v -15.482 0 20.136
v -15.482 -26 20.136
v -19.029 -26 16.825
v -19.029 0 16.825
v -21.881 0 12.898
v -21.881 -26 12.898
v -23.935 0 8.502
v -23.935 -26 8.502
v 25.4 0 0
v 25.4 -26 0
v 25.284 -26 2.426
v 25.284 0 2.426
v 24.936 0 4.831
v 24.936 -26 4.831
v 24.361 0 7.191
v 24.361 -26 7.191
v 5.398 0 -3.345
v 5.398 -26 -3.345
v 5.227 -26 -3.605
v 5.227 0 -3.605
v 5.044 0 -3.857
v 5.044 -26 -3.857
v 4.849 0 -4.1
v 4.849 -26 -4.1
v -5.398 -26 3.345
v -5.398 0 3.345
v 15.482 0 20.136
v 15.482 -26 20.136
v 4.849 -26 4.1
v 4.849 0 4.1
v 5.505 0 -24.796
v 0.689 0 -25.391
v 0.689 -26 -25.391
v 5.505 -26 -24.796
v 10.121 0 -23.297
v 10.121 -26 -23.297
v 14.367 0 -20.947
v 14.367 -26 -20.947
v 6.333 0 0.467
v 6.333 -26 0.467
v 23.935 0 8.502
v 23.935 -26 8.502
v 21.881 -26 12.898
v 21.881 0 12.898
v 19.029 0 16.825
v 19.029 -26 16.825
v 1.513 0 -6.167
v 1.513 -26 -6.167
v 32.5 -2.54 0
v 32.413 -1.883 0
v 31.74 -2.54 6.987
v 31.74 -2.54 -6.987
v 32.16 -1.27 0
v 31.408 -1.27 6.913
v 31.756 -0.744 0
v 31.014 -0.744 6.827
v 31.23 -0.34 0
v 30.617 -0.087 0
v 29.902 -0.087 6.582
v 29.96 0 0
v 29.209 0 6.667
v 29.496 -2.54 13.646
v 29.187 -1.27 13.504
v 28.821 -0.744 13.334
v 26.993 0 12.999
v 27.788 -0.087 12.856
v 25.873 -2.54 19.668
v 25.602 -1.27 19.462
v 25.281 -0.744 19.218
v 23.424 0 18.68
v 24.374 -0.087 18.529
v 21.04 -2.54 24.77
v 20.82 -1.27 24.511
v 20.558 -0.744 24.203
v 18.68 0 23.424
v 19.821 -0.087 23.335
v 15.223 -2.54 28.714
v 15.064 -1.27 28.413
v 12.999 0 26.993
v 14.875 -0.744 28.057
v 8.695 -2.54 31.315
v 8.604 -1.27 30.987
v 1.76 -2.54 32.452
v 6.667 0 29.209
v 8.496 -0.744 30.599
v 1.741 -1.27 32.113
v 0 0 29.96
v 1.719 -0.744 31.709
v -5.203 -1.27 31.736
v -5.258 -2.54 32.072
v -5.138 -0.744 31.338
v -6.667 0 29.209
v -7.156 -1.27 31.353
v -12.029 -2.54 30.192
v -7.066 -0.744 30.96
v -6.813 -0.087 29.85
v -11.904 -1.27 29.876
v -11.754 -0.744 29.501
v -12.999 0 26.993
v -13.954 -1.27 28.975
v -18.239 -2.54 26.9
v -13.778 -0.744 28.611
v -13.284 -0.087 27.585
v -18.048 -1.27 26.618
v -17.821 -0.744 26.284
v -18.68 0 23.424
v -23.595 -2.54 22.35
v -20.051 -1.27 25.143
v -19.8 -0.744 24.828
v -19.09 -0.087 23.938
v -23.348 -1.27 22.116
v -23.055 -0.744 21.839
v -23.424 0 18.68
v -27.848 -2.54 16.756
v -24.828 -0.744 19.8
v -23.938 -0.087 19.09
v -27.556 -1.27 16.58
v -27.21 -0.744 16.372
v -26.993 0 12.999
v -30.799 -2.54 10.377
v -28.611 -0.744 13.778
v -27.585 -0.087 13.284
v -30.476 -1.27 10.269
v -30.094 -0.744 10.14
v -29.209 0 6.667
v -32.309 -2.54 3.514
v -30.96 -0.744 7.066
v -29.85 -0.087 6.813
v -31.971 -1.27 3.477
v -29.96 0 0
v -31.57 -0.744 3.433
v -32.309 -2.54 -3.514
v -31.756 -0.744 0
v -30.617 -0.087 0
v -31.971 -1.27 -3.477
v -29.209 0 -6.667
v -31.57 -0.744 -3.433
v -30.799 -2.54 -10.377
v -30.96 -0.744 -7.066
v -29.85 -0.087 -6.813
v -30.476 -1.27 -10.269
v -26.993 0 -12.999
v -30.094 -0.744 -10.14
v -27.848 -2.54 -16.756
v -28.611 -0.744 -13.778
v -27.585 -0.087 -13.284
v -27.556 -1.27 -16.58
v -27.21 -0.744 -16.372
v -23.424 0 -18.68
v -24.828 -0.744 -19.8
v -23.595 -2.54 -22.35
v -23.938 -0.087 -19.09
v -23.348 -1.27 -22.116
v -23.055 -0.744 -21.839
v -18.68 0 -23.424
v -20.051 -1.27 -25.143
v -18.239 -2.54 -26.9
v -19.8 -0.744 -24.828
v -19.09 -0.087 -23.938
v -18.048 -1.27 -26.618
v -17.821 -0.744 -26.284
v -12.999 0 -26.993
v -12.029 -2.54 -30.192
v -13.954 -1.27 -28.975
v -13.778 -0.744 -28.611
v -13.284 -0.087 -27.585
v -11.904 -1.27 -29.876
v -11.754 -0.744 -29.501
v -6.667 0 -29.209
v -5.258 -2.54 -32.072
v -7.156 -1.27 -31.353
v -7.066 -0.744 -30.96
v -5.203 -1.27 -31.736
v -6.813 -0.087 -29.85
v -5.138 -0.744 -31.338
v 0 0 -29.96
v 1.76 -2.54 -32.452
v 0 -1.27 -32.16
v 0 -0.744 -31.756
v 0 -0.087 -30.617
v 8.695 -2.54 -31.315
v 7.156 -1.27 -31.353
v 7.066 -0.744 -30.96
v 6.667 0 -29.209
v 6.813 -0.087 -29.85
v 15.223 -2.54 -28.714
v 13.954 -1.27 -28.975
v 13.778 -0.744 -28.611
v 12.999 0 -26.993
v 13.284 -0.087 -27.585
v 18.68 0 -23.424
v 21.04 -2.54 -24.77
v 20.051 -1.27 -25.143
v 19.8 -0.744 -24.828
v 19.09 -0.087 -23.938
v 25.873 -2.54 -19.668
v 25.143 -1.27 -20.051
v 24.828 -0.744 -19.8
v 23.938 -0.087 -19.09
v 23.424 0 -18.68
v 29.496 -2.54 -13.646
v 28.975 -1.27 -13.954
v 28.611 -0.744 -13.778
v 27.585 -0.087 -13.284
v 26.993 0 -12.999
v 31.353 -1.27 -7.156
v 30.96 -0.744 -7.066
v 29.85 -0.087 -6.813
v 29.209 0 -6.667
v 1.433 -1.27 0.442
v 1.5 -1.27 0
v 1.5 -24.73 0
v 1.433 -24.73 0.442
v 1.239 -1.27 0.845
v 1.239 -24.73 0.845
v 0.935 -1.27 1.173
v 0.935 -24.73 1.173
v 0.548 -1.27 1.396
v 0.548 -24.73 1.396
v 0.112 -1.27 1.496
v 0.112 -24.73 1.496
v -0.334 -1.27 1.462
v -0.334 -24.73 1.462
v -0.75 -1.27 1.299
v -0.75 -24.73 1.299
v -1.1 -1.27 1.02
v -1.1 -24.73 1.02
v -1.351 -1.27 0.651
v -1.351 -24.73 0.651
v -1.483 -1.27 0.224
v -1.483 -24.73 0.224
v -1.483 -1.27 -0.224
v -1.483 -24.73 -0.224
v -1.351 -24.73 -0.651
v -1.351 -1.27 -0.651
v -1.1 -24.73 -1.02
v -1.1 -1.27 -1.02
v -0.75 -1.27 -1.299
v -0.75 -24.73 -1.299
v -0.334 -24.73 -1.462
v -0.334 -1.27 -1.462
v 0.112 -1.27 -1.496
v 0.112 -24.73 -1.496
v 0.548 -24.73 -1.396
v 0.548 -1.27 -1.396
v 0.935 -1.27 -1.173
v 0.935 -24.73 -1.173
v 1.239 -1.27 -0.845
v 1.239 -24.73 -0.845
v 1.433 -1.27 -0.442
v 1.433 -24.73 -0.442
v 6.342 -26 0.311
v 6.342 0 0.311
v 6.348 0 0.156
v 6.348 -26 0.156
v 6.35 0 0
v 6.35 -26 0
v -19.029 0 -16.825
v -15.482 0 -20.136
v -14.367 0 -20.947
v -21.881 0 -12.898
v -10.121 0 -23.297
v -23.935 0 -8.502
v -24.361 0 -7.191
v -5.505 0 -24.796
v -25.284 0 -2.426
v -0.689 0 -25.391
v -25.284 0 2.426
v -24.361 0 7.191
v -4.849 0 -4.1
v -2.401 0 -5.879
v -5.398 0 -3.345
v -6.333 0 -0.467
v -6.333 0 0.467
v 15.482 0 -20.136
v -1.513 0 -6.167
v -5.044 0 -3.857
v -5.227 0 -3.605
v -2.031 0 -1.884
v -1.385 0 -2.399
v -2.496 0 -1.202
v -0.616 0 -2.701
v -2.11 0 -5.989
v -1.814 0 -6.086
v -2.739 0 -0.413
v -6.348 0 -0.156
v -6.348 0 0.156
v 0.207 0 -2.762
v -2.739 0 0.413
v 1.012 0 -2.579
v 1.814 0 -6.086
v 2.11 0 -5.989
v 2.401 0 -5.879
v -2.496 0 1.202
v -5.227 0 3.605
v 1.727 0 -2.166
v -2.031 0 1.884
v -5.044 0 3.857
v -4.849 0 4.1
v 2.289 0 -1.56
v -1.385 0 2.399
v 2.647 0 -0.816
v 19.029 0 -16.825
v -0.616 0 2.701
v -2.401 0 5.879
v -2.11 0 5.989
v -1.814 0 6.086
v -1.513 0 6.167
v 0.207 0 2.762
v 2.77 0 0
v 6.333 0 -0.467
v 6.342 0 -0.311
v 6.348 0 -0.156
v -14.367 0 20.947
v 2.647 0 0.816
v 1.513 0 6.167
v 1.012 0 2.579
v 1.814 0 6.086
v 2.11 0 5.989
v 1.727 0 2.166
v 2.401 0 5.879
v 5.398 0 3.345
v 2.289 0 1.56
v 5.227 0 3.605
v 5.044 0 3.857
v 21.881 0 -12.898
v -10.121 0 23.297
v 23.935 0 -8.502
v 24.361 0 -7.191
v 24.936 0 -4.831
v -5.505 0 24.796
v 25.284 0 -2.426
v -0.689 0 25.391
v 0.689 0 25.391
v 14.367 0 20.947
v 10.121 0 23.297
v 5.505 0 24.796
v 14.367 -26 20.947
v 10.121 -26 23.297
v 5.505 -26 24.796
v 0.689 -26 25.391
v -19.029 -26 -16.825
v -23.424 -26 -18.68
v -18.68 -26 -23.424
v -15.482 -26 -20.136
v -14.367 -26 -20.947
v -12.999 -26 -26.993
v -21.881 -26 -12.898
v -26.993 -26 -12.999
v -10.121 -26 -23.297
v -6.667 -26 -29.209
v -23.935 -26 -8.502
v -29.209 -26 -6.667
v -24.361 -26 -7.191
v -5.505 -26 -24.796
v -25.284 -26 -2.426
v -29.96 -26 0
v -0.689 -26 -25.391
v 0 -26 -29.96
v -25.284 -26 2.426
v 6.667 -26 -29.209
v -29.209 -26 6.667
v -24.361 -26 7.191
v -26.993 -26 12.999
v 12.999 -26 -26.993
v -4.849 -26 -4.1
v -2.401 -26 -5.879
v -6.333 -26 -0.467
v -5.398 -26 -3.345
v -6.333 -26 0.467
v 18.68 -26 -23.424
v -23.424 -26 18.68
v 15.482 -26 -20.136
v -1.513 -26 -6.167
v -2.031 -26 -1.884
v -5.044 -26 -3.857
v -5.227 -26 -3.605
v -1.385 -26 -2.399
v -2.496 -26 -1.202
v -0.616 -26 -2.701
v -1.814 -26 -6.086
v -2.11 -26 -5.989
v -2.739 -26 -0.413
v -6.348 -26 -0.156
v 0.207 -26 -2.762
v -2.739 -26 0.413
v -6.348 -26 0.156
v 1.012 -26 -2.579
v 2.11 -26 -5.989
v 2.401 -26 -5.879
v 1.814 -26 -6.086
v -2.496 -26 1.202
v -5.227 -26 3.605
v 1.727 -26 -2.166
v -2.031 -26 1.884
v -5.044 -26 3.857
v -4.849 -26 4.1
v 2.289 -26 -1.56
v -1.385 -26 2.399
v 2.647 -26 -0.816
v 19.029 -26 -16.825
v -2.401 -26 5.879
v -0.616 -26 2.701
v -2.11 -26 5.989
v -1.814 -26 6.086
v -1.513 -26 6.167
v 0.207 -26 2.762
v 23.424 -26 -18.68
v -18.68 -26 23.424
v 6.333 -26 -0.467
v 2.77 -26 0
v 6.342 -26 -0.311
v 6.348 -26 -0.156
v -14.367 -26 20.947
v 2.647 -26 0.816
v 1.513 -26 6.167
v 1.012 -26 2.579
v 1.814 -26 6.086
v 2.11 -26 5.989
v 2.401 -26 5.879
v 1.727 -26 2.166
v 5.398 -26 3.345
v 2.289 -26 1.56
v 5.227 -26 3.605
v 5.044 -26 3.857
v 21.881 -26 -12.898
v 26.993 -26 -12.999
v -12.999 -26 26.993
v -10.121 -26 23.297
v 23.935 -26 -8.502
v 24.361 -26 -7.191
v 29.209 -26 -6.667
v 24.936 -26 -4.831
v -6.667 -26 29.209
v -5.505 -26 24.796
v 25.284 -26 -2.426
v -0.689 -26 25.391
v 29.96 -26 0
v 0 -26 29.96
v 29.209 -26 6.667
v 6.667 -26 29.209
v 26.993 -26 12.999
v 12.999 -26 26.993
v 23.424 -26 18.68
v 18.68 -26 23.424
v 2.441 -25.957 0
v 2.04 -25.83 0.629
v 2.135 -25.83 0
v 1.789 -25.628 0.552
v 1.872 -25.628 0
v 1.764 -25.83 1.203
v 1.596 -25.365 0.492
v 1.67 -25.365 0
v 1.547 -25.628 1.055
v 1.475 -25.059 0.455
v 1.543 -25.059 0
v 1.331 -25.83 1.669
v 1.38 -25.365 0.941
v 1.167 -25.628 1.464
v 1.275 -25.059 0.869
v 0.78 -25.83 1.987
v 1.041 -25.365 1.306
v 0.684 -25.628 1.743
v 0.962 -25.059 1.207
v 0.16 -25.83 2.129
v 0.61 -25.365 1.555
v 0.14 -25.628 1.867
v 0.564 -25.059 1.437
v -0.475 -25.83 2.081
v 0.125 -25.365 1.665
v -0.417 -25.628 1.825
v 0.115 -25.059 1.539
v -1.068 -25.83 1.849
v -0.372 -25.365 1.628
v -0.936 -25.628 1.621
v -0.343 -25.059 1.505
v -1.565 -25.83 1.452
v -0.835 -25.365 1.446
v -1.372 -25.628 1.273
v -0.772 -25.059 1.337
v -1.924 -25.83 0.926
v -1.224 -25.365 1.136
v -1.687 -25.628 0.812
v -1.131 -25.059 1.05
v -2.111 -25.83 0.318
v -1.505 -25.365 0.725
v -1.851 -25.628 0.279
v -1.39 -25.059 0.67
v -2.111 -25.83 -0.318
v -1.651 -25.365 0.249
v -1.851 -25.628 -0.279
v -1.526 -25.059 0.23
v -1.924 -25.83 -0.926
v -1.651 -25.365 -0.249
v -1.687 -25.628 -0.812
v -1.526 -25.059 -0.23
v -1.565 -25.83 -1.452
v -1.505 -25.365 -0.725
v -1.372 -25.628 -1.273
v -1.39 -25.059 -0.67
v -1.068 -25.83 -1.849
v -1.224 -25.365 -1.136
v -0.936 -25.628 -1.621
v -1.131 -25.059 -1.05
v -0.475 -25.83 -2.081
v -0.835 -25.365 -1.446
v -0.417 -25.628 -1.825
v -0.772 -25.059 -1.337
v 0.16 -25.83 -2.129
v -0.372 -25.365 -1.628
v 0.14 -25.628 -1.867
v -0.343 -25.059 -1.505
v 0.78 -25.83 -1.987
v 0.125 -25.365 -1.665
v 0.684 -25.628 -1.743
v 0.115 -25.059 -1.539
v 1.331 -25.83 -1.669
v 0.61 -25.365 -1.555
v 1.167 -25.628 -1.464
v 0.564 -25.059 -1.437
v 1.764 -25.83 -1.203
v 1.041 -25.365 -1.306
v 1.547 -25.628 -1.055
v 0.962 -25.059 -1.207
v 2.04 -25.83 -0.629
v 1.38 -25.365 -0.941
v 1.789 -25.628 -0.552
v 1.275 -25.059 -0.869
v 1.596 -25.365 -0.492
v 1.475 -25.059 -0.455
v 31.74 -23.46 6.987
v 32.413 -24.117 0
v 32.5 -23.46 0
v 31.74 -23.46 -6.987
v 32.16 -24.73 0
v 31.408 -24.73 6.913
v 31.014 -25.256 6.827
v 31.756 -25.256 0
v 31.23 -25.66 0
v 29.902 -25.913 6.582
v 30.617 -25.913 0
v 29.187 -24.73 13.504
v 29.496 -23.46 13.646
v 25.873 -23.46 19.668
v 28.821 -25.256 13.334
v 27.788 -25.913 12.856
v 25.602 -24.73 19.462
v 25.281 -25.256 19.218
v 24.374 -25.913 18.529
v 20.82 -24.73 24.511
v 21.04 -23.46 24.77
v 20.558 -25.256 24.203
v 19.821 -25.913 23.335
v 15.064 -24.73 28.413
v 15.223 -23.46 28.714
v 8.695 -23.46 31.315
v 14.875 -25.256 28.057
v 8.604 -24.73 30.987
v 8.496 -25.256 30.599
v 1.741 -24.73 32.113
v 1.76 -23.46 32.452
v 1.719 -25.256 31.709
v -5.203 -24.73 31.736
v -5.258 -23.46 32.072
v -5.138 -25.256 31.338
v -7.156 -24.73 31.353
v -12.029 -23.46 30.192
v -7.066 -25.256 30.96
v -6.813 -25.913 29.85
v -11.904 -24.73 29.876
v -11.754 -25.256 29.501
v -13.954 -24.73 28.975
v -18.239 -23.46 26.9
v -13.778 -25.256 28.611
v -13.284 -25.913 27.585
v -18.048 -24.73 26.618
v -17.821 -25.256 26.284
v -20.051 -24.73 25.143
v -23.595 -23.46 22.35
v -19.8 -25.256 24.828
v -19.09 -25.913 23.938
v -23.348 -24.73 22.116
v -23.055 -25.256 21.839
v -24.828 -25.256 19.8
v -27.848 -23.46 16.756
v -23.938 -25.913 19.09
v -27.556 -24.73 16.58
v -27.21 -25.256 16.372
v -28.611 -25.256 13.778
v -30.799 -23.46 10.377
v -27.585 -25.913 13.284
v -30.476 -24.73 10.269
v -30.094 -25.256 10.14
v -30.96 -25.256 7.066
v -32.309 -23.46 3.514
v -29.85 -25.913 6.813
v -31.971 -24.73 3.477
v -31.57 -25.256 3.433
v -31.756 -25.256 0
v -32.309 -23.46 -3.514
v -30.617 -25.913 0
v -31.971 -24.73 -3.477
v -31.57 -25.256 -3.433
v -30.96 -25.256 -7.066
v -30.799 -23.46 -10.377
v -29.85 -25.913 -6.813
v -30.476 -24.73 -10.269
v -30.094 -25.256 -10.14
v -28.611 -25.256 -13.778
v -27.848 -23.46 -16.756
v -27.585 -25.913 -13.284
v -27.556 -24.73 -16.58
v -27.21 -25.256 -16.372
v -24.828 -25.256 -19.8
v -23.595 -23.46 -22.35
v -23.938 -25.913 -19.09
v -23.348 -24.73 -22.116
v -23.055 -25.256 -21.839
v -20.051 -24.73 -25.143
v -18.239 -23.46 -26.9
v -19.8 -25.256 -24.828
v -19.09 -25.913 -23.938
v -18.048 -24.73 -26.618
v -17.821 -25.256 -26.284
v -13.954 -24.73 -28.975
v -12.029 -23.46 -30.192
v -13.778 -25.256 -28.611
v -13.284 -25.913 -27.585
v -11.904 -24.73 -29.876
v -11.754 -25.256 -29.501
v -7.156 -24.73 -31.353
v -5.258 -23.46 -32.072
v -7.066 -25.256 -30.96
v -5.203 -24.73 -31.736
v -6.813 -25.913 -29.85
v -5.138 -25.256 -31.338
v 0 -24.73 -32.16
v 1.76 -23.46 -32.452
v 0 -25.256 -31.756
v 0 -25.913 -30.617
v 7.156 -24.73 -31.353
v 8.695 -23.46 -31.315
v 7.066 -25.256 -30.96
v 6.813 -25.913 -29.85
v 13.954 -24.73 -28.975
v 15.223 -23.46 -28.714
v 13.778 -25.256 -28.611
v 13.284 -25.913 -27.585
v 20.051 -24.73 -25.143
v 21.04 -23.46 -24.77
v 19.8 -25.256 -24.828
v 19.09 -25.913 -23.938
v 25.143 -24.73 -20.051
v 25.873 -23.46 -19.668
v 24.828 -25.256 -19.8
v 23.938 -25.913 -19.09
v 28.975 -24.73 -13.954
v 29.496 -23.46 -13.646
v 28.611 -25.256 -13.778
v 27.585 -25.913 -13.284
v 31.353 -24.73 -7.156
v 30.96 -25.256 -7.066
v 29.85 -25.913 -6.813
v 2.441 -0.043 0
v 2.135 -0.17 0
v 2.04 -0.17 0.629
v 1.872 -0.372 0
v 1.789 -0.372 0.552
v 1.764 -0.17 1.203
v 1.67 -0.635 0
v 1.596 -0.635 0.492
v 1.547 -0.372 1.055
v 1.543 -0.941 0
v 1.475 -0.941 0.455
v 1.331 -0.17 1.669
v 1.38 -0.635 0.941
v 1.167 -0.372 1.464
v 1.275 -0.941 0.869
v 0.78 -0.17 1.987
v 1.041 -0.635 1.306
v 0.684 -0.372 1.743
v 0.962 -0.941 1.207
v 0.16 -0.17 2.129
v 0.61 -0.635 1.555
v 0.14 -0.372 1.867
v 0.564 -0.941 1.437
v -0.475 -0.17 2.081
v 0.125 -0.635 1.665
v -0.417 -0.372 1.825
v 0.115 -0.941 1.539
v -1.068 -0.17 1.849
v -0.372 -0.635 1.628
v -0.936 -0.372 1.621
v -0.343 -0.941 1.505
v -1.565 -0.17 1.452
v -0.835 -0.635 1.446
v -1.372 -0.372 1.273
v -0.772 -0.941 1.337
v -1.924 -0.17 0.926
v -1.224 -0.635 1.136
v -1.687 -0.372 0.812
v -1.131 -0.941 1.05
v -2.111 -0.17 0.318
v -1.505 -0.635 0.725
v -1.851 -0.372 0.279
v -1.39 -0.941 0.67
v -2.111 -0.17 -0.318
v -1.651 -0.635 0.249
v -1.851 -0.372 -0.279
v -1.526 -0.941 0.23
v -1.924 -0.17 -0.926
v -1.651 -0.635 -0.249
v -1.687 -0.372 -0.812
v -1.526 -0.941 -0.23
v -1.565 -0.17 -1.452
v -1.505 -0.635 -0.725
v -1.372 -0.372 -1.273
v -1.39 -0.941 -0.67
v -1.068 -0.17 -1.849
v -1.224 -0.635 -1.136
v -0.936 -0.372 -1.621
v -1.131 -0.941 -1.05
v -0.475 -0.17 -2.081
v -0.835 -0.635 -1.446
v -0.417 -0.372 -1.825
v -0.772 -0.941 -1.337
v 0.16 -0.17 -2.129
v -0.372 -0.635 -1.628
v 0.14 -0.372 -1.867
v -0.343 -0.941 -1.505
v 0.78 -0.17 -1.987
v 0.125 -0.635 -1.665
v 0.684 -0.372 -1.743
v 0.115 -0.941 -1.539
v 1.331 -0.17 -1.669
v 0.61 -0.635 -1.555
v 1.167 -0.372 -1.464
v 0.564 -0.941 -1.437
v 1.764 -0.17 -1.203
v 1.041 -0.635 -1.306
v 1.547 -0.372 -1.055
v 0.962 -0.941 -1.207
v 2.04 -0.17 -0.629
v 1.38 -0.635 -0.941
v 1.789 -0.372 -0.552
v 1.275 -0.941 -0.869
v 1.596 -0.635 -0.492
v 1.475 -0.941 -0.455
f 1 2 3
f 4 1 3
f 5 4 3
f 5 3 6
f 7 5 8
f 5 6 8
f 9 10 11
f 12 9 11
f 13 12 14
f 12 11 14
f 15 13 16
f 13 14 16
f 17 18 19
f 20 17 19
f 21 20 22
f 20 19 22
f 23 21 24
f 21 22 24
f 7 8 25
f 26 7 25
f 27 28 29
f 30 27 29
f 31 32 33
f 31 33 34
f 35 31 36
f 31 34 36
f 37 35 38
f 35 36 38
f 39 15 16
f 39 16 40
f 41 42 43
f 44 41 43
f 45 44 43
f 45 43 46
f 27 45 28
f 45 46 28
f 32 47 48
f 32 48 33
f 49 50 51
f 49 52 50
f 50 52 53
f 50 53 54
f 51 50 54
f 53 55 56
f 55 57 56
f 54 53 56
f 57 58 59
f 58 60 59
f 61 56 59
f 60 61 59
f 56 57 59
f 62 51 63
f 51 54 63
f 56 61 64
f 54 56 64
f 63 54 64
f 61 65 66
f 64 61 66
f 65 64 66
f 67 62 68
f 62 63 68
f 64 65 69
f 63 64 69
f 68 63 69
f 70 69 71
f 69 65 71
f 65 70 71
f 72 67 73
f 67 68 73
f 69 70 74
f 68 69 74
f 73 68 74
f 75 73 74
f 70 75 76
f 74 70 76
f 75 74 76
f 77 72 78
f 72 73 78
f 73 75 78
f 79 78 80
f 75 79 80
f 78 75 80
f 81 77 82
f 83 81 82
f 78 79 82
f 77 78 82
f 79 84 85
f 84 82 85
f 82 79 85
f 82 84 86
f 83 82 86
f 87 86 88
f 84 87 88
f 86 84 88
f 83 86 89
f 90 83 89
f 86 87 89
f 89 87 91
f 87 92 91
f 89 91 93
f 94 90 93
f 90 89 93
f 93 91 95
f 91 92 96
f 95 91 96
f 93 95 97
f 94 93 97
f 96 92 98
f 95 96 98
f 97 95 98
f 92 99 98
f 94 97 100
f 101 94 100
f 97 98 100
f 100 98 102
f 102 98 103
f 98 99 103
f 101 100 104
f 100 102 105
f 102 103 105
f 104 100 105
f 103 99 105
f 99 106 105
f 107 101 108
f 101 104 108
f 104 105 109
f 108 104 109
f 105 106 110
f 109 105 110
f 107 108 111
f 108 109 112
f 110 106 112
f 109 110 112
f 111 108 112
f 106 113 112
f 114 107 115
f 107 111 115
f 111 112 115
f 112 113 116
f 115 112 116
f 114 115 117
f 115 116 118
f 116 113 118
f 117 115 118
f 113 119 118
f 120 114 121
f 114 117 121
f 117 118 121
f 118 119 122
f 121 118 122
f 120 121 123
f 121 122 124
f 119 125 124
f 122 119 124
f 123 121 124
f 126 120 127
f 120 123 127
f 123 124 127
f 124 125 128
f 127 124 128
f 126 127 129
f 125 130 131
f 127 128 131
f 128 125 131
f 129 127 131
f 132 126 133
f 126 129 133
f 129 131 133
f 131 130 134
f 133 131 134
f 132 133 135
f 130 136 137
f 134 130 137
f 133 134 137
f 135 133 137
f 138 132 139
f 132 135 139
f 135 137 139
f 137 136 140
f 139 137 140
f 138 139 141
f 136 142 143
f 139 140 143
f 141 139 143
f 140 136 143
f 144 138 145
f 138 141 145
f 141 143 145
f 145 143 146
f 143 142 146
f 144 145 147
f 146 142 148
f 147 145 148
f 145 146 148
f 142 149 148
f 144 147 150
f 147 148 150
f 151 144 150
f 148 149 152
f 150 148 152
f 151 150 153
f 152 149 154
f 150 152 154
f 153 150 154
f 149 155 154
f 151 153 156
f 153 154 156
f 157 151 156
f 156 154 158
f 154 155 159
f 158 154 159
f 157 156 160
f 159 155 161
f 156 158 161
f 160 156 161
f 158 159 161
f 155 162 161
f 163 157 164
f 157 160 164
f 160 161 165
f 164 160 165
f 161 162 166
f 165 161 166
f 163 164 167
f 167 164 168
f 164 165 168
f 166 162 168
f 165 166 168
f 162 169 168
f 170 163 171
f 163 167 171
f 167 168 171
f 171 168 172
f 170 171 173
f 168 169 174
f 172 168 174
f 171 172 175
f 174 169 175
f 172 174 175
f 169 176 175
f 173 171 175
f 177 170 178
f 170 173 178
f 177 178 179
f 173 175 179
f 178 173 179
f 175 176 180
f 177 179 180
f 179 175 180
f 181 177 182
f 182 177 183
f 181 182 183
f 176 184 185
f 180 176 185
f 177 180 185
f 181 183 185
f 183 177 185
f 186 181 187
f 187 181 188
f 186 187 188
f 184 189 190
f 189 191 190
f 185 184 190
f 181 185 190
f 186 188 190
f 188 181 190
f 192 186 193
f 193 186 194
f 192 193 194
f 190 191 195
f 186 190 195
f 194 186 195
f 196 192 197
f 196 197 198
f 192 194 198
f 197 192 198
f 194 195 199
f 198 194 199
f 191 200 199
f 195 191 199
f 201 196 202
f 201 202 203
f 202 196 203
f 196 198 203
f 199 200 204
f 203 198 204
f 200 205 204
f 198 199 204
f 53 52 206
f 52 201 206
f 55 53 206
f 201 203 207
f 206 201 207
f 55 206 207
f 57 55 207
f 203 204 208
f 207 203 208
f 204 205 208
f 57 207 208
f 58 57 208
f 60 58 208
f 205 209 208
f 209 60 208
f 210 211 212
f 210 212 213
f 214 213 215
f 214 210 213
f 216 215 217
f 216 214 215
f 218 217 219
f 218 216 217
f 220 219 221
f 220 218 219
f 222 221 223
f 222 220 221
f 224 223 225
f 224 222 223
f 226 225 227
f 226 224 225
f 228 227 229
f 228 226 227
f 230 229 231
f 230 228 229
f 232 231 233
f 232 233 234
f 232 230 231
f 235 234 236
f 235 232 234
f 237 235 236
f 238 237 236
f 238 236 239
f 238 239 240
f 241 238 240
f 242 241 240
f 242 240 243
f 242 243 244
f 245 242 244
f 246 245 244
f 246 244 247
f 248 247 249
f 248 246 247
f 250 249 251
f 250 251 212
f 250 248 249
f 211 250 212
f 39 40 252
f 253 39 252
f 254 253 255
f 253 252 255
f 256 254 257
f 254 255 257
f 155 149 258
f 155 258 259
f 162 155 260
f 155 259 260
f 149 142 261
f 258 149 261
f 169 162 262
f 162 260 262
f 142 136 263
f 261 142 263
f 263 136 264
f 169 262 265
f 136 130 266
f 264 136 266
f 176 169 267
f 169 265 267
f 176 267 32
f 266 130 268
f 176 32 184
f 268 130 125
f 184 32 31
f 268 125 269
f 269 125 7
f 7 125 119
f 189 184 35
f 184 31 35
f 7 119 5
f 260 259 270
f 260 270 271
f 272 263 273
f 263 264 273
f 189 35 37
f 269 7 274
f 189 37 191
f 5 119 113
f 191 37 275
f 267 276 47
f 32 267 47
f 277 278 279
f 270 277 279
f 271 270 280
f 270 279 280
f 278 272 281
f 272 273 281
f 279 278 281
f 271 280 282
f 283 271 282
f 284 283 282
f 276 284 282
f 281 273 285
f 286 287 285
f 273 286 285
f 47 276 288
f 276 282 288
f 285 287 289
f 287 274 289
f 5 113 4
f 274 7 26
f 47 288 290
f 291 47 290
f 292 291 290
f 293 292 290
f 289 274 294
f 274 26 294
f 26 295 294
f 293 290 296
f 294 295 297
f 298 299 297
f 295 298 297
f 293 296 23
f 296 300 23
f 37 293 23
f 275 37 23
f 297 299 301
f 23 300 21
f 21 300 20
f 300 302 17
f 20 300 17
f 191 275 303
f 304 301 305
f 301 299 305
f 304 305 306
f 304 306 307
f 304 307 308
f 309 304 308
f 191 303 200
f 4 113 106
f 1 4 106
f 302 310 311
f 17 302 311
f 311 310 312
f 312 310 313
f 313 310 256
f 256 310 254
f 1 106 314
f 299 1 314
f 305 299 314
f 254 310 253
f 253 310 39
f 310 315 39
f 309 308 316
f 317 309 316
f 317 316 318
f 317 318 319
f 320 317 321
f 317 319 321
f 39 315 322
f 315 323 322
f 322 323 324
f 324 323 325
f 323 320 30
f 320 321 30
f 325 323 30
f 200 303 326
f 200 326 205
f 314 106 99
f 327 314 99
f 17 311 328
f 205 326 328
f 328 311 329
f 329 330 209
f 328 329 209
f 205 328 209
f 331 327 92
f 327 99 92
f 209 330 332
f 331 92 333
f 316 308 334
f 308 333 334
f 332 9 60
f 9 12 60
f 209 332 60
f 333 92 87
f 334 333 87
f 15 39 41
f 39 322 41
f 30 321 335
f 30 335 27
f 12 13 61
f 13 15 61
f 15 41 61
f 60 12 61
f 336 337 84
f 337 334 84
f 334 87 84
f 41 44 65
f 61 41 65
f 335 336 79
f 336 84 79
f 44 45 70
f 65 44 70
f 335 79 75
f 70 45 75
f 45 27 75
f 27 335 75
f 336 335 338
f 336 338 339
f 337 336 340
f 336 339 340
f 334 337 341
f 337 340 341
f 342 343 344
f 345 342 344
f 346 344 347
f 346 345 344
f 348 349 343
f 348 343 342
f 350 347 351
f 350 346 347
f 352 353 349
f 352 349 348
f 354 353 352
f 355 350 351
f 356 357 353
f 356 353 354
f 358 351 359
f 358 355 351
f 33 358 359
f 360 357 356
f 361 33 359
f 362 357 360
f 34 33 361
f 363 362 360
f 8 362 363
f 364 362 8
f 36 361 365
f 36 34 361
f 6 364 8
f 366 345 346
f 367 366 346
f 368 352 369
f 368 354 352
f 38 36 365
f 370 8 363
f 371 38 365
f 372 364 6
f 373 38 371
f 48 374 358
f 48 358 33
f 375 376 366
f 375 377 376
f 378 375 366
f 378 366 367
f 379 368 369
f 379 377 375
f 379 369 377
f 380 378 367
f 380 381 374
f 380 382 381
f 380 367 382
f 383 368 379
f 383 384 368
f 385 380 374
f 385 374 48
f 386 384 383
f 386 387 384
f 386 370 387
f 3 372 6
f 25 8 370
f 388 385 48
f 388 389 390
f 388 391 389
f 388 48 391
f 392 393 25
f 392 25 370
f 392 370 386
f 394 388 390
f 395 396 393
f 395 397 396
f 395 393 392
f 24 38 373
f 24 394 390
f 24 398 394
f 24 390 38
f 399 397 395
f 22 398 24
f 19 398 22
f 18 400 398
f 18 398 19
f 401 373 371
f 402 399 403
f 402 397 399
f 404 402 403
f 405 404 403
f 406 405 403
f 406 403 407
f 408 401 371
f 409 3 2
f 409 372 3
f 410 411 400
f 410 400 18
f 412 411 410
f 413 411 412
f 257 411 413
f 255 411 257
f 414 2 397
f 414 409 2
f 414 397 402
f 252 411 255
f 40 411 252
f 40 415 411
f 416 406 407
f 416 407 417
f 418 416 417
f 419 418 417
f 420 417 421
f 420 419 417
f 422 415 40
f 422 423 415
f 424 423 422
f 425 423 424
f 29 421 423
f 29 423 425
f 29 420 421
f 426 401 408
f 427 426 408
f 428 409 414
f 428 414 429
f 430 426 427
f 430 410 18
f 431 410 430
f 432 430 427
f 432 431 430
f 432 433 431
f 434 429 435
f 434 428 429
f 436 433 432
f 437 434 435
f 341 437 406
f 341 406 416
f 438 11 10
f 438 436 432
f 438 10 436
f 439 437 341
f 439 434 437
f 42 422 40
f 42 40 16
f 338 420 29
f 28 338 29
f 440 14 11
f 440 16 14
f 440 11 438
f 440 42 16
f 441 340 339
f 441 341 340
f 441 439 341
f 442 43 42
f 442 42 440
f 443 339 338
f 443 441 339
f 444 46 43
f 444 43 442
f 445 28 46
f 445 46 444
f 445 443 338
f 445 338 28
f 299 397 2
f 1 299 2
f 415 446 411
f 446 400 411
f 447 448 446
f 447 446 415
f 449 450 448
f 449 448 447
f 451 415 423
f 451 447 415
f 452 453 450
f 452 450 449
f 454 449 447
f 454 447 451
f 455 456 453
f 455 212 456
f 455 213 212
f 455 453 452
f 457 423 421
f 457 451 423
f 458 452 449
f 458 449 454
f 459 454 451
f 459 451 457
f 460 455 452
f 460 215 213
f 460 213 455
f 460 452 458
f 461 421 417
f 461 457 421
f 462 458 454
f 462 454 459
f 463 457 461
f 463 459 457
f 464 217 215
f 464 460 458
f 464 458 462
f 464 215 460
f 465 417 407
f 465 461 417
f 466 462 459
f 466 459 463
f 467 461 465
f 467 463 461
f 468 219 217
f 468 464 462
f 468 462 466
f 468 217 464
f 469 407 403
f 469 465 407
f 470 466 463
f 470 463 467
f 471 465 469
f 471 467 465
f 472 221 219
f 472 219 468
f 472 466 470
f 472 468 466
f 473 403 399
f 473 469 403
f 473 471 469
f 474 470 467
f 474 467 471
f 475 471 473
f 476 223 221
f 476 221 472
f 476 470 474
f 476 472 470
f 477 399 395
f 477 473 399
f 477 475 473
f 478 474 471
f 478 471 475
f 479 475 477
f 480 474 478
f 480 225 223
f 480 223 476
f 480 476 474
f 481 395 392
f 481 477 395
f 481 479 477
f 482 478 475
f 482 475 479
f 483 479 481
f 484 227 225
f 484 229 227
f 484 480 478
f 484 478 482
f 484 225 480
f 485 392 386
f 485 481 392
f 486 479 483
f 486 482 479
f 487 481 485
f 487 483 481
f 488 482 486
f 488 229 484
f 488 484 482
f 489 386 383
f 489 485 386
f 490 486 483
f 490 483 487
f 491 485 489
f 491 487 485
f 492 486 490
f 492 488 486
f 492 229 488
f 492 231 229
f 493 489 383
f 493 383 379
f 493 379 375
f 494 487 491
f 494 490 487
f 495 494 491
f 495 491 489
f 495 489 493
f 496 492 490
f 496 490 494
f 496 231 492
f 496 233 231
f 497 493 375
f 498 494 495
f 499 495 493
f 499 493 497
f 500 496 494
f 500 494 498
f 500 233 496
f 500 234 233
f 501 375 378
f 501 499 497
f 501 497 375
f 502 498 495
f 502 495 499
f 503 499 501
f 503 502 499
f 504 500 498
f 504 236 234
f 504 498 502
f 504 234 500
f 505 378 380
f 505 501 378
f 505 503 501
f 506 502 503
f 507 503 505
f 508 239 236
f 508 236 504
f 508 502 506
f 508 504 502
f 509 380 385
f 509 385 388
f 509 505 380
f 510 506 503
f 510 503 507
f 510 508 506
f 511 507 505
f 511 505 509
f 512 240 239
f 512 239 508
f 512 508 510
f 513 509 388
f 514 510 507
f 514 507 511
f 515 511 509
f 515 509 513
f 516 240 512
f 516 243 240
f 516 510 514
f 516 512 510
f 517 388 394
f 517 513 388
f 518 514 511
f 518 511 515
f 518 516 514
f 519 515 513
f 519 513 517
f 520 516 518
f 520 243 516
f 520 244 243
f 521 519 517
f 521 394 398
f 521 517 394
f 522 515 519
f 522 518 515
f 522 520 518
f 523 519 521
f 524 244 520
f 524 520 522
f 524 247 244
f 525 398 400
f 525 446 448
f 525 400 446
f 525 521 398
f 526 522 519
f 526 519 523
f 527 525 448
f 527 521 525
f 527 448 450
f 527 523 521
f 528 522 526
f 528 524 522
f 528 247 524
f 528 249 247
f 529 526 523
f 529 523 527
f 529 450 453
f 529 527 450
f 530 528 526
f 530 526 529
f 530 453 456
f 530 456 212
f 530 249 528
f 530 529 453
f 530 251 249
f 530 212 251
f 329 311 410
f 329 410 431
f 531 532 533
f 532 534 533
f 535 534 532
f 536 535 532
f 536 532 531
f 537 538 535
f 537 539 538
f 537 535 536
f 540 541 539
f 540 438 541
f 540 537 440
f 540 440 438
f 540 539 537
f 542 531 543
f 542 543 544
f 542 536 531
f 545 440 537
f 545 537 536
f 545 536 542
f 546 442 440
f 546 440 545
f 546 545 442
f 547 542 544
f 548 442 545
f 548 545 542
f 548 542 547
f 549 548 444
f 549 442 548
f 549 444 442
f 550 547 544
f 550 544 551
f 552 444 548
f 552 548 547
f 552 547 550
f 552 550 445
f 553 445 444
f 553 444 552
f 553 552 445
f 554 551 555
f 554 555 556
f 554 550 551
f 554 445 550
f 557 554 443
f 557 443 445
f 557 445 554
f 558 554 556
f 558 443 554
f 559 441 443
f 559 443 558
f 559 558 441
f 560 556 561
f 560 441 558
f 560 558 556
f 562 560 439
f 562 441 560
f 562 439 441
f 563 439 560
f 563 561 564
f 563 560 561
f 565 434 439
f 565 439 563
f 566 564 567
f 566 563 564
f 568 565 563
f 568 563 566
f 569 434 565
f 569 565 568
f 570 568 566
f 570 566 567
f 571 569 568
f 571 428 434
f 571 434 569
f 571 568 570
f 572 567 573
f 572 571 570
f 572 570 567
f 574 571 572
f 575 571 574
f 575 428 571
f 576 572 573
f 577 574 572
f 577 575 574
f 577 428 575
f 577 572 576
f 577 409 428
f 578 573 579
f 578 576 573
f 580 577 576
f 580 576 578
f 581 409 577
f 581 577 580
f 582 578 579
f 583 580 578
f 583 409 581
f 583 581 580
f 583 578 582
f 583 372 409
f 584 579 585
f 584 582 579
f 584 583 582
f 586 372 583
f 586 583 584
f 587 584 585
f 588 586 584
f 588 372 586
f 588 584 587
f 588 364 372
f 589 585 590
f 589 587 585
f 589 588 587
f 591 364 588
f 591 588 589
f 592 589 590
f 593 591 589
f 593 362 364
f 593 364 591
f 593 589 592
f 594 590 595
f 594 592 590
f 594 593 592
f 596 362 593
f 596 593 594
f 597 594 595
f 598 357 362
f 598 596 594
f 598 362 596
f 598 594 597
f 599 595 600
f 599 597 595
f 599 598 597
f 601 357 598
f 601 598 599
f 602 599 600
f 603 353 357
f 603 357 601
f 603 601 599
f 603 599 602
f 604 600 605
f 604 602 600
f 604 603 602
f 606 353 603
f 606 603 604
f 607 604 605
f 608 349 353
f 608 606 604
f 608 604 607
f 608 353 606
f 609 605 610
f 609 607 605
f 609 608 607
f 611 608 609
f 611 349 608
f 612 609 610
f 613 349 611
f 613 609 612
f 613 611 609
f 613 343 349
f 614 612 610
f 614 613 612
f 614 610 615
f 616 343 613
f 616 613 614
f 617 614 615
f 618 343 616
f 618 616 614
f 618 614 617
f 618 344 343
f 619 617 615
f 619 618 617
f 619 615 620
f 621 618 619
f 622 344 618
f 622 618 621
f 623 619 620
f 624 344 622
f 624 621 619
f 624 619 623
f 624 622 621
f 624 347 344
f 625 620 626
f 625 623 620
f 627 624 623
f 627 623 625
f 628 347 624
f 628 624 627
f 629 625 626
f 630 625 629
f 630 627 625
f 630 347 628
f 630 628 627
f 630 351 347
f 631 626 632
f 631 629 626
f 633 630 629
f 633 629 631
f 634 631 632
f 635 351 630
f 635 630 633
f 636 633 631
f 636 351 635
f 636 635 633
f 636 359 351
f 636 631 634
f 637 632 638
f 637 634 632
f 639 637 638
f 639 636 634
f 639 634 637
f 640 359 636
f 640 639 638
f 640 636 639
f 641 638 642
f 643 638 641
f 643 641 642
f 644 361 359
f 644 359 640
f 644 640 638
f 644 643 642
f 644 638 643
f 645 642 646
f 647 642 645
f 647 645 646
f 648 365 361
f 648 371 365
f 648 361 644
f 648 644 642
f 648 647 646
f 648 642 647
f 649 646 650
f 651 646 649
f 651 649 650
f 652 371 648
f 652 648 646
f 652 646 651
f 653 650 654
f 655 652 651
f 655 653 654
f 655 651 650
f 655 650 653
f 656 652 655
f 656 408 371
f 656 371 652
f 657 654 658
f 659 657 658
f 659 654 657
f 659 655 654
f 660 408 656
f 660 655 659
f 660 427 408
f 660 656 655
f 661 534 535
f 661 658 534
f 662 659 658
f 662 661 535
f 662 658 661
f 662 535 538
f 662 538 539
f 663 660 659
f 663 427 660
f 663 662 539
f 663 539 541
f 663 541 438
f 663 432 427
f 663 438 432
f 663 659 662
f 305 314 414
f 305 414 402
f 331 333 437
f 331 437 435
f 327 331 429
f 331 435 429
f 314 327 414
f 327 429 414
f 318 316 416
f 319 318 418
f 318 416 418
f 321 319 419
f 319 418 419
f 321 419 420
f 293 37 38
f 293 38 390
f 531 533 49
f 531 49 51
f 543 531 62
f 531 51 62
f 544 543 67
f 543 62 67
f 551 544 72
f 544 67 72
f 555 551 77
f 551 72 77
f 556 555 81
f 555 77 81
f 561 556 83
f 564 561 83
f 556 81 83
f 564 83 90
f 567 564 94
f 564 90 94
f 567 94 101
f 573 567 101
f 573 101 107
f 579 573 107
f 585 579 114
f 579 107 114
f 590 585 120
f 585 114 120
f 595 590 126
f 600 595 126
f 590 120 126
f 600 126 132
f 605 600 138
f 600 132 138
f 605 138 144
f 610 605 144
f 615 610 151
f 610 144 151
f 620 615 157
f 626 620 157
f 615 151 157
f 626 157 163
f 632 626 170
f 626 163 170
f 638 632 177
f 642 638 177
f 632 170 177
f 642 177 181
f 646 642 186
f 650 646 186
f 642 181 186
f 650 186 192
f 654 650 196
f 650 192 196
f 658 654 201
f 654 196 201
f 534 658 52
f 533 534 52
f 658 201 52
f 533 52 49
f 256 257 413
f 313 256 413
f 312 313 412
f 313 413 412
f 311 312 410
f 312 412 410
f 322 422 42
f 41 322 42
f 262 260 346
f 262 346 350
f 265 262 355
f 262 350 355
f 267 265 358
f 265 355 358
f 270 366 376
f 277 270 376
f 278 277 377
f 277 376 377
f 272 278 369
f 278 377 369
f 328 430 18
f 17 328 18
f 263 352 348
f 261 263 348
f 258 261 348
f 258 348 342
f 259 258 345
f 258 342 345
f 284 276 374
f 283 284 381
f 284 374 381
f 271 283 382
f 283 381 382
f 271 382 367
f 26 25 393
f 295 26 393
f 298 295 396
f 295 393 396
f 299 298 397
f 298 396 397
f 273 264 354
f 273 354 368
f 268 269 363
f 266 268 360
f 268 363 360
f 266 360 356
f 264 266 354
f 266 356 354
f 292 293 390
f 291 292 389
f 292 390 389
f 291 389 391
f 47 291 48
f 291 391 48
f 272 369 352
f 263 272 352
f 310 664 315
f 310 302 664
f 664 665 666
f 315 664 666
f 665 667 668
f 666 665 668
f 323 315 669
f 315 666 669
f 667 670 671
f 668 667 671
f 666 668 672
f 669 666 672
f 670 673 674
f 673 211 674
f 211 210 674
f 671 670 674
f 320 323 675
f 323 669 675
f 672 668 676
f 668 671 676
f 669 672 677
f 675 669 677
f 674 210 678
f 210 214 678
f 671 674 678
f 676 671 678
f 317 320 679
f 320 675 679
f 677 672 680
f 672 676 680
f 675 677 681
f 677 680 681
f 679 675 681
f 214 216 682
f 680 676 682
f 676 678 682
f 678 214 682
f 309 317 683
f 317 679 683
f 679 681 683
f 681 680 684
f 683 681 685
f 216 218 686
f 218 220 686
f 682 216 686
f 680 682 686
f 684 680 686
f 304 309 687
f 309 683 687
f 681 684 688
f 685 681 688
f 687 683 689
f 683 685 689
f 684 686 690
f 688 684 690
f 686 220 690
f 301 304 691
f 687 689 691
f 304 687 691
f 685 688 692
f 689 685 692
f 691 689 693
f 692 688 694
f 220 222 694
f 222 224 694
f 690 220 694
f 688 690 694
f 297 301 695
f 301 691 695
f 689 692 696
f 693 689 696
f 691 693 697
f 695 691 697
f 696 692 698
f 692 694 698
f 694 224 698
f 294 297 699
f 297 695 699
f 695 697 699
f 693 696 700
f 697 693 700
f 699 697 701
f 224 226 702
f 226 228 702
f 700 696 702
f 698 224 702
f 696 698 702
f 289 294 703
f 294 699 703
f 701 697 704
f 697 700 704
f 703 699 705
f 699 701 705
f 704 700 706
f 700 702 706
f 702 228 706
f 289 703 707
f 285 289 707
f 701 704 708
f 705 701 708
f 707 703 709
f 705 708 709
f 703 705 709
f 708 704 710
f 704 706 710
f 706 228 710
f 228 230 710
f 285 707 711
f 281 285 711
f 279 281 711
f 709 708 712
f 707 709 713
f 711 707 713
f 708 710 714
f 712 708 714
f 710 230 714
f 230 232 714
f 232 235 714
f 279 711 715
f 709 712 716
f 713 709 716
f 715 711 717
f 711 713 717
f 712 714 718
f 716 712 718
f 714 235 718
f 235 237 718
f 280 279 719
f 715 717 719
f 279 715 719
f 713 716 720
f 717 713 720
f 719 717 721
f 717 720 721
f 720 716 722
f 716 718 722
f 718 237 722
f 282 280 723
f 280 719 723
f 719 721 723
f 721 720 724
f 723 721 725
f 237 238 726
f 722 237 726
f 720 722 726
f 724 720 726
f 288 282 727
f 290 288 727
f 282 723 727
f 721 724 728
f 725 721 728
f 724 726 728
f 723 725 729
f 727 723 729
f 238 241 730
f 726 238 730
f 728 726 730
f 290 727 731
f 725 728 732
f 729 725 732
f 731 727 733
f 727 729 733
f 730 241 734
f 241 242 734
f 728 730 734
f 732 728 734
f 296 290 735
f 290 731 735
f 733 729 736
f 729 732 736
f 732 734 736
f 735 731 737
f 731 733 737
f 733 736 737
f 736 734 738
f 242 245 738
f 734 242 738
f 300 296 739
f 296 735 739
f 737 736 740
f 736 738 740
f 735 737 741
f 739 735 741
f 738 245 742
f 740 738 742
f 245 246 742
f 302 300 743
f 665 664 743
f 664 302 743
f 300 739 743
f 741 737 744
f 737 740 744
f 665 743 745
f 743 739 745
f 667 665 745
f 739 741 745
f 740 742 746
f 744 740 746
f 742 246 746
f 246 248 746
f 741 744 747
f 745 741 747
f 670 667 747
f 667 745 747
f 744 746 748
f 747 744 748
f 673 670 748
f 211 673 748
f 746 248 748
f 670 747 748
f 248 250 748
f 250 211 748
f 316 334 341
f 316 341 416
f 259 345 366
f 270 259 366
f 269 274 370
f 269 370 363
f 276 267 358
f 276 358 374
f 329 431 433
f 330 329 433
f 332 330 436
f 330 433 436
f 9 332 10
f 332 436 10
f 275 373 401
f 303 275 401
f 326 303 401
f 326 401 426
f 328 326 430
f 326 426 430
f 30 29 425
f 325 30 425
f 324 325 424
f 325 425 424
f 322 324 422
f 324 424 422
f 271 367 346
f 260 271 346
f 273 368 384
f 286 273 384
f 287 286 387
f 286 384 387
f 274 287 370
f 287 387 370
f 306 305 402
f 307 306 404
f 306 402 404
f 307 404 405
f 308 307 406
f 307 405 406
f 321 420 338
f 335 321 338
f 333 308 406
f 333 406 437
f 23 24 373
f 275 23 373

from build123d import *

# Parameters (mm, degrees)
F0_R     = 32.5
F0_R_2   = 1.5
F1_DEPTH = 26
F2_R     = 2.54
F4_DEPTH = 50.8
F5_R     = 1.27


with BuildPart() as f1:
    # F0 (on Front) → F1 (new body)
    with BuildSketch(Plane.XZ):
        Circle(F0_R)
        Circle(F0_R_2, mode=Mode.SUBTRACT)
    extrude(amount=F1_DEPTH)

    # F2
    f2_edges = [f1.edges().sort_by_distance(p)[0] for p in [
        (-32.5, -26, 0),
        (-32.5, 0, 0),
    ]]
    fillet(f2_edges, radius=F2_R)

    # F3 (on face) → F4 (cut)
    with BuildSketch(Plane.XZ.offset(26)):
        with BuildLine():
            Line((-1.512987, 6.16712), (-0.689091, 25.390651))
            ThreePointArc((-0.689091, 25.390651), (-7.849032, 24.156836), (-14.366764, 20.946505))
            Line((-14.366764, 20.946505), (-2.40091, 5.878617))
            ThreePointArc((-2.40091, 5.878617), (-1.962258, 6.039209), (-1.512987, 6.16712))
        make_face()
        with BuildLine():
            Line((2.40091, 5.878617), (14.366764, 20.946505))
            ThreePointArc((14.366764, 20.946505), (7.849032, 24.156836), (0.689091, 25.390651))
            Line((0.689091, 25.390651), (1.512987, 6.16712))
            ThreePointArc((1.512987, 6.16712), (1.962258, 6.039209), (2.40091, 5.878617))
        make_face()
        with BuildLine():
            Line((5.397741, 3.344681), (23.935003, 8.501507))
            ThreePointArc((23.935003, 8.501507), (20.549032, 14.929745), (15.481736, 20.136431))
            Line((15.481736, 20.136431), (4.848975, 4.099993))
            ThreePointArc((4.848975, 4.099993), (5.137258, 3.732436), (5.397741, 3.344681))
        make_face()
        with BuildLine():
            ThreePointArc((24.360885, -7.190779), (25.138879, -3.632735), (25.4, 0))
            ThreePointArc((25.4, 0), (25.138879, 3.632735), (24.360885, 7.190779))
            Line((24.360885, 7.190779), (6.332818, 0.466808))
            ThreePointArc((6.332818, 0.466808), (6.345703, 0.233562), (6.35, 0))
            ThreePointArc((6.35, 0), (6.345703, -0.233562), (6.332818, -0.466808))
            Line((6.332818, -0.466808), (24.360885, -7.190779))
        make_face()
        with BuildLine():
            ThreePointArc((15.481736, -20.136431), (20.549032, -14.929745), (23.935003, -8.501507))
            Line((23.935003, -8.501507), (5.397741, -3.344681))
            ThreePointArc((5.397741, -3.344681), (5.137258, -3.732436), (4.848975, -4.099993))
            Line((4.848975, -4.099993), (15.481736, -20.136431))
        make_face()
        with BuildLine():
            ThreePointArc((0.689091, -25.390651), (7.849032, -24.156836), (14.366764, -20.946505))
            Line((14.366764, -20.946505), (2.40091, -5.878617))
            ThreePointArc((2.40091, -5.878617), (1.962258, -6.039209), (1.512987, -6.16712))
            Line((1.512987, -6.16712), (0.689091, -25.390651))
        make_face()
        with BuildLine():
            ThreePointArc((-14.366764, -20.946505), (-7.849032, -24.156836), (-0.689091, -25.390651))
            Line((-0.689091, -25.390651), (-1.512987, -6.16712))
            ThreePointArc((-1.512987, -6.16712), (-1.962258, -6.039209), (-2.40091, -5.878617))
            Line((-2.40091, -5.878617), (-14.366764, -20.946505))
        make_face()
        with BuildLine():
            ThreePointArc((-23.935003, -8.501507), (-20.549032, -14.929745), (-15.481736, -20.136431))
            Line((-15.481736, -20.136431), (-4.848975, -4.099993))
            ThreePointArc((-4.848975, -4.099993), (-5.137258, -3.732436), (-5.397741, -3.344681))
            Line((-5.397741, -3.344681), (-23.935003, -8.501507))
        make_face()
        with BuildLine():
            Line((-6.332818, 0.466808), (-24.360885, 7.190779))
            ThreePointArc((-24.360885, 7.190779), (-25.4, 0), (-24.360885, -7.190779))
            Line((-24.360885, -7.190779), (-6.332818, -0.466808))
            ThreePointArc((-6.332818, -0.466808), (-6.35, 0), (-6.332818, 0.466808))
        make_face()
        with BuildLine():
            Line((-4.848975, 4.099993), (-15.481736, 20.136431))
            ThreePointArc((-15.481736, 20.136431), (-20.549032, 14.929745), (-23.935003, 8.501507))
            Line((-23.935003, 8.501507), (-5.397741, 3.344681))
            ThreePointArc((-5.397741, 3.344681), (-5.137258, 3.732436), (-4.848975, 4.099993))
        make_face()
    extrude(amount=-F4_DEPTH, mode=Mode.SUBTRACT)

    # F5
    f5_edges = [f1.edges().sort_by_distance(p)[0] for p in [
        (-1.5, -26, 0),
        (-1.5, 0, 0),
    ]]
    fillet(f5_edges, radius=F5_R)


solid = f1.part
